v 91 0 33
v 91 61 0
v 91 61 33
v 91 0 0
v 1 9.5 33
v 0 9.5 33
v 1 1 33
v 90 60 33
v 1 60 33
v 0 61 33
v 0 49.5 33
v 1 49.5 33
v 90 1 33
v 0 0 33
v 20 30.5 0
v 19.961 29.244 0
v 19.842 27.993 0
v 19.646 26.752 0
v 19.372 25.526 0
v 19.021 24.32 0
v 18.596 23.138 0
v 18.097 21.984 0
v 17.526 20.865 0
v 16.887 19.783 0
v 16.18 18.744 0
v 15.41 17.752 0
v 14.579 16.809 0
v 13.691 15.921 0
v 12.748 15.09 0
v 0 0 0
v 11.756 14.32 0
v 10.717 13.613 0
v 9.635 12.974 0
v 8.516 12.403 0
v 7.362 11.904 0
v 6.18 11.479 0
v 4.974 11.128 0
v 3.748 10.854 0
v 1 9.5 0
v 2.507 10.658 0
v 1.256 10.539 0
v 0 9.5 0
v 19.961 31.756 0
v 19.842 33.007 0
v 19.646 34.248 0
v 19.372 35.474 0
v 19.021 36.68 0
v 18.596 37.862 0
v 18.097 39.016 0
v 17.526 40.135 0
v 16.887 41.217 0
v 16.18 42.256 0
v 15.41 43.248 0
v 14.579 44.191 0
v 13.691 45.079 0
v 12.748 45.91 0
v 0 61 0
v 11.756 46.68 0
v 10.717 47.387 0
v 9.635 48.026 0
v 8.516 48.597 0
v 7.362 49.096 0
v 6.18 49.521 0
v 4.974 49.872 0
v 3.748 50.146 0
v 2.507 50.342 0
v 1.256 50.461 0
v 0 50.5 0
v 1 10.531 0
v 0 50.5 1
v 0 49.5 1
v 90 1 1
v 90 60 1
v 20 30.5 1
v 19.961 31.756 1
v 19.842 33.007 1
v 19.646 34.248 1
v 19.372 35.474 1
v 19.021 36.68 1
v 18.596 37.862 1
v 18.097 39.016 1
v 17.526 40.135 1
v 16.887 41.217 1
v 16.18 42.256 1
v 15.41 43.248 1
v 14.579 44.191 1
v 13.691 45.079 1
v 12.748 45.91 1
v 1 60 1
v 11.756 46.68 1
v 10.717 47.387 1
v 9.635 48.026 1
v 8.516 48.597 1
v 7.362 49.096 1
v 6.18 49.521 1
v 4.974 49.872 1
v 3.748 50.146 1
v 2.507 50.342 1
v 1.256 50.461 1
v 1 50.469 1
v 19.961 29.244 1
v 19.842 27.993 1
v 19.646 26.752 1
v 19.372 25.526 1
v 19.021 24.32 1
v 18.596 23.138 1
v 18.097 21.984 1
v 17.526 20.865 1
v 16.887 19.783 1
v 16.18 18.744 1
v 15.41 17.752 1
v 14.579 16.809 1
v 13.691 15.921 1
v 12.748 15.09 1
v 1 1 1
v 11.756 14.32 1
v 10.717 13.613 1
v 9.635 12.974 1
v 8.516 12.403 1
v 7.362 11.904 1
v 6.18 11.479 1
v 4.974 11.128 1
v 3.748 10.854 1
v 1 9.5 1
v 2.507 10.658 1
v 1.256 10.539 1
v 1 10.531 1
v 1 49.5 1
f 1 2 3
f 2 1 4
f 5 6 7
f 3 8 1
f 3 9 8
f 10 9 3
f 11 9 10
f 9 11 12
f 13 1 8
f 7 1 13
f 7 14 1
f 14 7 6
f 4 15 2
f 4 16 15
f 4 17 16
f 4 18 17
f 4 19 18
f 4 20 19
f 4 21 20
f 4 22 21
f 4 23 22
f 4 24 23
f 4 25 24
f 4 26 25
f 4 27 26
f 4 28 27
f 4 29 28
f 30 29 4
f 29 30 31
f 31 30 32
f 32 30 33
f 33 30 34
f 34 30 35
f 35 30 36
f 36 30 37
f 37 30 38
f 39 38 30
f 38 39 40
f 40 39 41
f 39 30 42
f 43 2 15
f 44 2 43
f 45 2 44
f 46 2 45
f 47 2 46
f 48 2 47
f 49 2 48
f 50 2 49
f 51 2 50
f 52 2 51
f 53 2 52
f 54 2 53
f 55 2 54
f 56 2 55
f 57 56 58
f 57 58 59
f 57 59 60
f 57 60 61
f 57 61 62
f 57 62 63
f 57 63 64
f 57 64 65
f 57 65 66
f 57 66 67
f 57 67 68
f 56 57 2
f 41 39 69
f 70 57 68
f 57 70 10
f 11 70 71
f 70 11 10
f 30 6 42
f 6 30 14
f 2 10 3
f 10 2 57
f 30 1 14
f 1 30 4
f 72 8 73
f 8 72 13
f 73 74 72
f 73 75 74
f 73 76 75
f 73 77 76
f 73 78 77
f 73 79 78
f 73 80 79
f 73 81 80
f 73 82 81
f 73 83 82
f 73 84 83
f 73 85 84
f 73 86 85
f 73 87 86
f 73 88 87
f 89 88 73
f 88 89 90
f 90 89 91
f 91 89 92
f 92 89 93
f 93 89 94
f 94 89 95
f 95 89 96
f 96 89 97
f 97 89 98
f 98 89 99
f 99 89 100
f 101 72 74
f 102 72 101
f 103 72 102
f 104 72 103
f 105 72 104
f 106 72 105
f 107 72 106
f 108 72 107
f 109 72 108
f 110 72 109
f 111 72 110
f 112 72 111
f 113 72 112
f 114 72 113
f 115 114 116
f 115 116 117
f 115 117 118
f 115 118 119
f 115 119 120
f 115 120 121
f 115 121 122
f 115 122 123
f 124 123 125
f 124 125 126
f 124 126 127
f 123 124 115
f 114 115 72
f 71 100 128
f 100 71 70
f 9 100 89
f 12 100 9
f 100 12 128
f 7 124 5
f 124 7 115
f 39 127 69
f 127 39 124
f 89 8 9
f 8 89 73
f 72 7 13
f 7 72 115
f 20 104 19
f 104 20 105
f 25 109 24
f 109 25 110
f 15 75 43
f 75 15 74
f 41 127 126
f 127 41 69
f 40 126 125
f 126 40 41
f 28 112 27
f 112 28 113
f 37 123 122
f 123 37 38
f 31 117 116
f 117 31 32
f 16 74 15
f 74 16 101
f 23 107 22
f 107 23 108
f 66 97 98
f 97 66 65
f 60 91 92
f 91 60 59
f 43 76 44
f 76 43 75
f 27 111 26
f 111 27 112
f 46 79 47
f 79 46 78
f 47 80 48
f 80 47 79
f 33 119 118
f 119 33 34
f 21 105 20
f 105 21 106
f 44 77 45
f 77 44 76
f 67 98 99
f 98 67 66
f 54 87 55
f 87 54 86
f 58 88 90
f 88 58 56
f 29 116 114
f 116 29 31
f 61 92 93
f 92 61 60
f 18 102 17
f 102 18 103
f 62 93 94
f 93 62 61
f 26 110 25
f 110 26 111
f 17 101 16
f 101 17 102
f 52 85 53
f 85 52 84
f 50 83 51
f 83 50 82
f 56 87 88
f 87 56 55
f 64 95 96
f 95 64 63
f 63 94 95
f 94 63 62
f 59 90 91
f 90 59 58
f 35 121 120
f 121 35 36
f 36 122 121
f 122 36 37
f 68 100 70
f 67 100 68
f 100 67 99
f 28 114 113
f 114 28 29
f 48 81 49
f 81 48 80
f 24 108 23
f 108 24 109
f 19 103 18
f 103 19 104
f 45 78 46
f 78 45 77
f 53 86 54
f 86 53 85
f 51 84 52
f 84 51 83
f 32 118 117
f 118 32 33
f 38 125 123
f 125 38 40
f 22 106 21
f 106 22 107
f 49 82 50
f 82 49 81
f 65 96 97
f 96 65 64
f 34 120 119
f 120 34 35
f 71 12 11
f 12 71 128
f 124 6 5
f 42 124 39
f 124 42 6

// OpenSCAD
// Karten: 87mm x 57mm -> 89x59
// Automa: 10mm hoch -> 13mm
// Bonuskarten: 13mm -> 15mm
// Vogelkarten: 30mm hoch -> 32mm
// Rahmen: 1mm

// Wertungsblock: 112x81mm

hoehe = 32;
$fn = 100;

difference(){
    cube([91,61,hoehe+1]);
    translate([1,1,1]){
        cube([89,59,hoehe]);
    }
    translate([0,61/2,0]){
        linear_extrude(1){
            circle(20);
        }
    }
    #translate([0,19/2,0]){
        cube([1,40,hoehe+1]);
    }
}
